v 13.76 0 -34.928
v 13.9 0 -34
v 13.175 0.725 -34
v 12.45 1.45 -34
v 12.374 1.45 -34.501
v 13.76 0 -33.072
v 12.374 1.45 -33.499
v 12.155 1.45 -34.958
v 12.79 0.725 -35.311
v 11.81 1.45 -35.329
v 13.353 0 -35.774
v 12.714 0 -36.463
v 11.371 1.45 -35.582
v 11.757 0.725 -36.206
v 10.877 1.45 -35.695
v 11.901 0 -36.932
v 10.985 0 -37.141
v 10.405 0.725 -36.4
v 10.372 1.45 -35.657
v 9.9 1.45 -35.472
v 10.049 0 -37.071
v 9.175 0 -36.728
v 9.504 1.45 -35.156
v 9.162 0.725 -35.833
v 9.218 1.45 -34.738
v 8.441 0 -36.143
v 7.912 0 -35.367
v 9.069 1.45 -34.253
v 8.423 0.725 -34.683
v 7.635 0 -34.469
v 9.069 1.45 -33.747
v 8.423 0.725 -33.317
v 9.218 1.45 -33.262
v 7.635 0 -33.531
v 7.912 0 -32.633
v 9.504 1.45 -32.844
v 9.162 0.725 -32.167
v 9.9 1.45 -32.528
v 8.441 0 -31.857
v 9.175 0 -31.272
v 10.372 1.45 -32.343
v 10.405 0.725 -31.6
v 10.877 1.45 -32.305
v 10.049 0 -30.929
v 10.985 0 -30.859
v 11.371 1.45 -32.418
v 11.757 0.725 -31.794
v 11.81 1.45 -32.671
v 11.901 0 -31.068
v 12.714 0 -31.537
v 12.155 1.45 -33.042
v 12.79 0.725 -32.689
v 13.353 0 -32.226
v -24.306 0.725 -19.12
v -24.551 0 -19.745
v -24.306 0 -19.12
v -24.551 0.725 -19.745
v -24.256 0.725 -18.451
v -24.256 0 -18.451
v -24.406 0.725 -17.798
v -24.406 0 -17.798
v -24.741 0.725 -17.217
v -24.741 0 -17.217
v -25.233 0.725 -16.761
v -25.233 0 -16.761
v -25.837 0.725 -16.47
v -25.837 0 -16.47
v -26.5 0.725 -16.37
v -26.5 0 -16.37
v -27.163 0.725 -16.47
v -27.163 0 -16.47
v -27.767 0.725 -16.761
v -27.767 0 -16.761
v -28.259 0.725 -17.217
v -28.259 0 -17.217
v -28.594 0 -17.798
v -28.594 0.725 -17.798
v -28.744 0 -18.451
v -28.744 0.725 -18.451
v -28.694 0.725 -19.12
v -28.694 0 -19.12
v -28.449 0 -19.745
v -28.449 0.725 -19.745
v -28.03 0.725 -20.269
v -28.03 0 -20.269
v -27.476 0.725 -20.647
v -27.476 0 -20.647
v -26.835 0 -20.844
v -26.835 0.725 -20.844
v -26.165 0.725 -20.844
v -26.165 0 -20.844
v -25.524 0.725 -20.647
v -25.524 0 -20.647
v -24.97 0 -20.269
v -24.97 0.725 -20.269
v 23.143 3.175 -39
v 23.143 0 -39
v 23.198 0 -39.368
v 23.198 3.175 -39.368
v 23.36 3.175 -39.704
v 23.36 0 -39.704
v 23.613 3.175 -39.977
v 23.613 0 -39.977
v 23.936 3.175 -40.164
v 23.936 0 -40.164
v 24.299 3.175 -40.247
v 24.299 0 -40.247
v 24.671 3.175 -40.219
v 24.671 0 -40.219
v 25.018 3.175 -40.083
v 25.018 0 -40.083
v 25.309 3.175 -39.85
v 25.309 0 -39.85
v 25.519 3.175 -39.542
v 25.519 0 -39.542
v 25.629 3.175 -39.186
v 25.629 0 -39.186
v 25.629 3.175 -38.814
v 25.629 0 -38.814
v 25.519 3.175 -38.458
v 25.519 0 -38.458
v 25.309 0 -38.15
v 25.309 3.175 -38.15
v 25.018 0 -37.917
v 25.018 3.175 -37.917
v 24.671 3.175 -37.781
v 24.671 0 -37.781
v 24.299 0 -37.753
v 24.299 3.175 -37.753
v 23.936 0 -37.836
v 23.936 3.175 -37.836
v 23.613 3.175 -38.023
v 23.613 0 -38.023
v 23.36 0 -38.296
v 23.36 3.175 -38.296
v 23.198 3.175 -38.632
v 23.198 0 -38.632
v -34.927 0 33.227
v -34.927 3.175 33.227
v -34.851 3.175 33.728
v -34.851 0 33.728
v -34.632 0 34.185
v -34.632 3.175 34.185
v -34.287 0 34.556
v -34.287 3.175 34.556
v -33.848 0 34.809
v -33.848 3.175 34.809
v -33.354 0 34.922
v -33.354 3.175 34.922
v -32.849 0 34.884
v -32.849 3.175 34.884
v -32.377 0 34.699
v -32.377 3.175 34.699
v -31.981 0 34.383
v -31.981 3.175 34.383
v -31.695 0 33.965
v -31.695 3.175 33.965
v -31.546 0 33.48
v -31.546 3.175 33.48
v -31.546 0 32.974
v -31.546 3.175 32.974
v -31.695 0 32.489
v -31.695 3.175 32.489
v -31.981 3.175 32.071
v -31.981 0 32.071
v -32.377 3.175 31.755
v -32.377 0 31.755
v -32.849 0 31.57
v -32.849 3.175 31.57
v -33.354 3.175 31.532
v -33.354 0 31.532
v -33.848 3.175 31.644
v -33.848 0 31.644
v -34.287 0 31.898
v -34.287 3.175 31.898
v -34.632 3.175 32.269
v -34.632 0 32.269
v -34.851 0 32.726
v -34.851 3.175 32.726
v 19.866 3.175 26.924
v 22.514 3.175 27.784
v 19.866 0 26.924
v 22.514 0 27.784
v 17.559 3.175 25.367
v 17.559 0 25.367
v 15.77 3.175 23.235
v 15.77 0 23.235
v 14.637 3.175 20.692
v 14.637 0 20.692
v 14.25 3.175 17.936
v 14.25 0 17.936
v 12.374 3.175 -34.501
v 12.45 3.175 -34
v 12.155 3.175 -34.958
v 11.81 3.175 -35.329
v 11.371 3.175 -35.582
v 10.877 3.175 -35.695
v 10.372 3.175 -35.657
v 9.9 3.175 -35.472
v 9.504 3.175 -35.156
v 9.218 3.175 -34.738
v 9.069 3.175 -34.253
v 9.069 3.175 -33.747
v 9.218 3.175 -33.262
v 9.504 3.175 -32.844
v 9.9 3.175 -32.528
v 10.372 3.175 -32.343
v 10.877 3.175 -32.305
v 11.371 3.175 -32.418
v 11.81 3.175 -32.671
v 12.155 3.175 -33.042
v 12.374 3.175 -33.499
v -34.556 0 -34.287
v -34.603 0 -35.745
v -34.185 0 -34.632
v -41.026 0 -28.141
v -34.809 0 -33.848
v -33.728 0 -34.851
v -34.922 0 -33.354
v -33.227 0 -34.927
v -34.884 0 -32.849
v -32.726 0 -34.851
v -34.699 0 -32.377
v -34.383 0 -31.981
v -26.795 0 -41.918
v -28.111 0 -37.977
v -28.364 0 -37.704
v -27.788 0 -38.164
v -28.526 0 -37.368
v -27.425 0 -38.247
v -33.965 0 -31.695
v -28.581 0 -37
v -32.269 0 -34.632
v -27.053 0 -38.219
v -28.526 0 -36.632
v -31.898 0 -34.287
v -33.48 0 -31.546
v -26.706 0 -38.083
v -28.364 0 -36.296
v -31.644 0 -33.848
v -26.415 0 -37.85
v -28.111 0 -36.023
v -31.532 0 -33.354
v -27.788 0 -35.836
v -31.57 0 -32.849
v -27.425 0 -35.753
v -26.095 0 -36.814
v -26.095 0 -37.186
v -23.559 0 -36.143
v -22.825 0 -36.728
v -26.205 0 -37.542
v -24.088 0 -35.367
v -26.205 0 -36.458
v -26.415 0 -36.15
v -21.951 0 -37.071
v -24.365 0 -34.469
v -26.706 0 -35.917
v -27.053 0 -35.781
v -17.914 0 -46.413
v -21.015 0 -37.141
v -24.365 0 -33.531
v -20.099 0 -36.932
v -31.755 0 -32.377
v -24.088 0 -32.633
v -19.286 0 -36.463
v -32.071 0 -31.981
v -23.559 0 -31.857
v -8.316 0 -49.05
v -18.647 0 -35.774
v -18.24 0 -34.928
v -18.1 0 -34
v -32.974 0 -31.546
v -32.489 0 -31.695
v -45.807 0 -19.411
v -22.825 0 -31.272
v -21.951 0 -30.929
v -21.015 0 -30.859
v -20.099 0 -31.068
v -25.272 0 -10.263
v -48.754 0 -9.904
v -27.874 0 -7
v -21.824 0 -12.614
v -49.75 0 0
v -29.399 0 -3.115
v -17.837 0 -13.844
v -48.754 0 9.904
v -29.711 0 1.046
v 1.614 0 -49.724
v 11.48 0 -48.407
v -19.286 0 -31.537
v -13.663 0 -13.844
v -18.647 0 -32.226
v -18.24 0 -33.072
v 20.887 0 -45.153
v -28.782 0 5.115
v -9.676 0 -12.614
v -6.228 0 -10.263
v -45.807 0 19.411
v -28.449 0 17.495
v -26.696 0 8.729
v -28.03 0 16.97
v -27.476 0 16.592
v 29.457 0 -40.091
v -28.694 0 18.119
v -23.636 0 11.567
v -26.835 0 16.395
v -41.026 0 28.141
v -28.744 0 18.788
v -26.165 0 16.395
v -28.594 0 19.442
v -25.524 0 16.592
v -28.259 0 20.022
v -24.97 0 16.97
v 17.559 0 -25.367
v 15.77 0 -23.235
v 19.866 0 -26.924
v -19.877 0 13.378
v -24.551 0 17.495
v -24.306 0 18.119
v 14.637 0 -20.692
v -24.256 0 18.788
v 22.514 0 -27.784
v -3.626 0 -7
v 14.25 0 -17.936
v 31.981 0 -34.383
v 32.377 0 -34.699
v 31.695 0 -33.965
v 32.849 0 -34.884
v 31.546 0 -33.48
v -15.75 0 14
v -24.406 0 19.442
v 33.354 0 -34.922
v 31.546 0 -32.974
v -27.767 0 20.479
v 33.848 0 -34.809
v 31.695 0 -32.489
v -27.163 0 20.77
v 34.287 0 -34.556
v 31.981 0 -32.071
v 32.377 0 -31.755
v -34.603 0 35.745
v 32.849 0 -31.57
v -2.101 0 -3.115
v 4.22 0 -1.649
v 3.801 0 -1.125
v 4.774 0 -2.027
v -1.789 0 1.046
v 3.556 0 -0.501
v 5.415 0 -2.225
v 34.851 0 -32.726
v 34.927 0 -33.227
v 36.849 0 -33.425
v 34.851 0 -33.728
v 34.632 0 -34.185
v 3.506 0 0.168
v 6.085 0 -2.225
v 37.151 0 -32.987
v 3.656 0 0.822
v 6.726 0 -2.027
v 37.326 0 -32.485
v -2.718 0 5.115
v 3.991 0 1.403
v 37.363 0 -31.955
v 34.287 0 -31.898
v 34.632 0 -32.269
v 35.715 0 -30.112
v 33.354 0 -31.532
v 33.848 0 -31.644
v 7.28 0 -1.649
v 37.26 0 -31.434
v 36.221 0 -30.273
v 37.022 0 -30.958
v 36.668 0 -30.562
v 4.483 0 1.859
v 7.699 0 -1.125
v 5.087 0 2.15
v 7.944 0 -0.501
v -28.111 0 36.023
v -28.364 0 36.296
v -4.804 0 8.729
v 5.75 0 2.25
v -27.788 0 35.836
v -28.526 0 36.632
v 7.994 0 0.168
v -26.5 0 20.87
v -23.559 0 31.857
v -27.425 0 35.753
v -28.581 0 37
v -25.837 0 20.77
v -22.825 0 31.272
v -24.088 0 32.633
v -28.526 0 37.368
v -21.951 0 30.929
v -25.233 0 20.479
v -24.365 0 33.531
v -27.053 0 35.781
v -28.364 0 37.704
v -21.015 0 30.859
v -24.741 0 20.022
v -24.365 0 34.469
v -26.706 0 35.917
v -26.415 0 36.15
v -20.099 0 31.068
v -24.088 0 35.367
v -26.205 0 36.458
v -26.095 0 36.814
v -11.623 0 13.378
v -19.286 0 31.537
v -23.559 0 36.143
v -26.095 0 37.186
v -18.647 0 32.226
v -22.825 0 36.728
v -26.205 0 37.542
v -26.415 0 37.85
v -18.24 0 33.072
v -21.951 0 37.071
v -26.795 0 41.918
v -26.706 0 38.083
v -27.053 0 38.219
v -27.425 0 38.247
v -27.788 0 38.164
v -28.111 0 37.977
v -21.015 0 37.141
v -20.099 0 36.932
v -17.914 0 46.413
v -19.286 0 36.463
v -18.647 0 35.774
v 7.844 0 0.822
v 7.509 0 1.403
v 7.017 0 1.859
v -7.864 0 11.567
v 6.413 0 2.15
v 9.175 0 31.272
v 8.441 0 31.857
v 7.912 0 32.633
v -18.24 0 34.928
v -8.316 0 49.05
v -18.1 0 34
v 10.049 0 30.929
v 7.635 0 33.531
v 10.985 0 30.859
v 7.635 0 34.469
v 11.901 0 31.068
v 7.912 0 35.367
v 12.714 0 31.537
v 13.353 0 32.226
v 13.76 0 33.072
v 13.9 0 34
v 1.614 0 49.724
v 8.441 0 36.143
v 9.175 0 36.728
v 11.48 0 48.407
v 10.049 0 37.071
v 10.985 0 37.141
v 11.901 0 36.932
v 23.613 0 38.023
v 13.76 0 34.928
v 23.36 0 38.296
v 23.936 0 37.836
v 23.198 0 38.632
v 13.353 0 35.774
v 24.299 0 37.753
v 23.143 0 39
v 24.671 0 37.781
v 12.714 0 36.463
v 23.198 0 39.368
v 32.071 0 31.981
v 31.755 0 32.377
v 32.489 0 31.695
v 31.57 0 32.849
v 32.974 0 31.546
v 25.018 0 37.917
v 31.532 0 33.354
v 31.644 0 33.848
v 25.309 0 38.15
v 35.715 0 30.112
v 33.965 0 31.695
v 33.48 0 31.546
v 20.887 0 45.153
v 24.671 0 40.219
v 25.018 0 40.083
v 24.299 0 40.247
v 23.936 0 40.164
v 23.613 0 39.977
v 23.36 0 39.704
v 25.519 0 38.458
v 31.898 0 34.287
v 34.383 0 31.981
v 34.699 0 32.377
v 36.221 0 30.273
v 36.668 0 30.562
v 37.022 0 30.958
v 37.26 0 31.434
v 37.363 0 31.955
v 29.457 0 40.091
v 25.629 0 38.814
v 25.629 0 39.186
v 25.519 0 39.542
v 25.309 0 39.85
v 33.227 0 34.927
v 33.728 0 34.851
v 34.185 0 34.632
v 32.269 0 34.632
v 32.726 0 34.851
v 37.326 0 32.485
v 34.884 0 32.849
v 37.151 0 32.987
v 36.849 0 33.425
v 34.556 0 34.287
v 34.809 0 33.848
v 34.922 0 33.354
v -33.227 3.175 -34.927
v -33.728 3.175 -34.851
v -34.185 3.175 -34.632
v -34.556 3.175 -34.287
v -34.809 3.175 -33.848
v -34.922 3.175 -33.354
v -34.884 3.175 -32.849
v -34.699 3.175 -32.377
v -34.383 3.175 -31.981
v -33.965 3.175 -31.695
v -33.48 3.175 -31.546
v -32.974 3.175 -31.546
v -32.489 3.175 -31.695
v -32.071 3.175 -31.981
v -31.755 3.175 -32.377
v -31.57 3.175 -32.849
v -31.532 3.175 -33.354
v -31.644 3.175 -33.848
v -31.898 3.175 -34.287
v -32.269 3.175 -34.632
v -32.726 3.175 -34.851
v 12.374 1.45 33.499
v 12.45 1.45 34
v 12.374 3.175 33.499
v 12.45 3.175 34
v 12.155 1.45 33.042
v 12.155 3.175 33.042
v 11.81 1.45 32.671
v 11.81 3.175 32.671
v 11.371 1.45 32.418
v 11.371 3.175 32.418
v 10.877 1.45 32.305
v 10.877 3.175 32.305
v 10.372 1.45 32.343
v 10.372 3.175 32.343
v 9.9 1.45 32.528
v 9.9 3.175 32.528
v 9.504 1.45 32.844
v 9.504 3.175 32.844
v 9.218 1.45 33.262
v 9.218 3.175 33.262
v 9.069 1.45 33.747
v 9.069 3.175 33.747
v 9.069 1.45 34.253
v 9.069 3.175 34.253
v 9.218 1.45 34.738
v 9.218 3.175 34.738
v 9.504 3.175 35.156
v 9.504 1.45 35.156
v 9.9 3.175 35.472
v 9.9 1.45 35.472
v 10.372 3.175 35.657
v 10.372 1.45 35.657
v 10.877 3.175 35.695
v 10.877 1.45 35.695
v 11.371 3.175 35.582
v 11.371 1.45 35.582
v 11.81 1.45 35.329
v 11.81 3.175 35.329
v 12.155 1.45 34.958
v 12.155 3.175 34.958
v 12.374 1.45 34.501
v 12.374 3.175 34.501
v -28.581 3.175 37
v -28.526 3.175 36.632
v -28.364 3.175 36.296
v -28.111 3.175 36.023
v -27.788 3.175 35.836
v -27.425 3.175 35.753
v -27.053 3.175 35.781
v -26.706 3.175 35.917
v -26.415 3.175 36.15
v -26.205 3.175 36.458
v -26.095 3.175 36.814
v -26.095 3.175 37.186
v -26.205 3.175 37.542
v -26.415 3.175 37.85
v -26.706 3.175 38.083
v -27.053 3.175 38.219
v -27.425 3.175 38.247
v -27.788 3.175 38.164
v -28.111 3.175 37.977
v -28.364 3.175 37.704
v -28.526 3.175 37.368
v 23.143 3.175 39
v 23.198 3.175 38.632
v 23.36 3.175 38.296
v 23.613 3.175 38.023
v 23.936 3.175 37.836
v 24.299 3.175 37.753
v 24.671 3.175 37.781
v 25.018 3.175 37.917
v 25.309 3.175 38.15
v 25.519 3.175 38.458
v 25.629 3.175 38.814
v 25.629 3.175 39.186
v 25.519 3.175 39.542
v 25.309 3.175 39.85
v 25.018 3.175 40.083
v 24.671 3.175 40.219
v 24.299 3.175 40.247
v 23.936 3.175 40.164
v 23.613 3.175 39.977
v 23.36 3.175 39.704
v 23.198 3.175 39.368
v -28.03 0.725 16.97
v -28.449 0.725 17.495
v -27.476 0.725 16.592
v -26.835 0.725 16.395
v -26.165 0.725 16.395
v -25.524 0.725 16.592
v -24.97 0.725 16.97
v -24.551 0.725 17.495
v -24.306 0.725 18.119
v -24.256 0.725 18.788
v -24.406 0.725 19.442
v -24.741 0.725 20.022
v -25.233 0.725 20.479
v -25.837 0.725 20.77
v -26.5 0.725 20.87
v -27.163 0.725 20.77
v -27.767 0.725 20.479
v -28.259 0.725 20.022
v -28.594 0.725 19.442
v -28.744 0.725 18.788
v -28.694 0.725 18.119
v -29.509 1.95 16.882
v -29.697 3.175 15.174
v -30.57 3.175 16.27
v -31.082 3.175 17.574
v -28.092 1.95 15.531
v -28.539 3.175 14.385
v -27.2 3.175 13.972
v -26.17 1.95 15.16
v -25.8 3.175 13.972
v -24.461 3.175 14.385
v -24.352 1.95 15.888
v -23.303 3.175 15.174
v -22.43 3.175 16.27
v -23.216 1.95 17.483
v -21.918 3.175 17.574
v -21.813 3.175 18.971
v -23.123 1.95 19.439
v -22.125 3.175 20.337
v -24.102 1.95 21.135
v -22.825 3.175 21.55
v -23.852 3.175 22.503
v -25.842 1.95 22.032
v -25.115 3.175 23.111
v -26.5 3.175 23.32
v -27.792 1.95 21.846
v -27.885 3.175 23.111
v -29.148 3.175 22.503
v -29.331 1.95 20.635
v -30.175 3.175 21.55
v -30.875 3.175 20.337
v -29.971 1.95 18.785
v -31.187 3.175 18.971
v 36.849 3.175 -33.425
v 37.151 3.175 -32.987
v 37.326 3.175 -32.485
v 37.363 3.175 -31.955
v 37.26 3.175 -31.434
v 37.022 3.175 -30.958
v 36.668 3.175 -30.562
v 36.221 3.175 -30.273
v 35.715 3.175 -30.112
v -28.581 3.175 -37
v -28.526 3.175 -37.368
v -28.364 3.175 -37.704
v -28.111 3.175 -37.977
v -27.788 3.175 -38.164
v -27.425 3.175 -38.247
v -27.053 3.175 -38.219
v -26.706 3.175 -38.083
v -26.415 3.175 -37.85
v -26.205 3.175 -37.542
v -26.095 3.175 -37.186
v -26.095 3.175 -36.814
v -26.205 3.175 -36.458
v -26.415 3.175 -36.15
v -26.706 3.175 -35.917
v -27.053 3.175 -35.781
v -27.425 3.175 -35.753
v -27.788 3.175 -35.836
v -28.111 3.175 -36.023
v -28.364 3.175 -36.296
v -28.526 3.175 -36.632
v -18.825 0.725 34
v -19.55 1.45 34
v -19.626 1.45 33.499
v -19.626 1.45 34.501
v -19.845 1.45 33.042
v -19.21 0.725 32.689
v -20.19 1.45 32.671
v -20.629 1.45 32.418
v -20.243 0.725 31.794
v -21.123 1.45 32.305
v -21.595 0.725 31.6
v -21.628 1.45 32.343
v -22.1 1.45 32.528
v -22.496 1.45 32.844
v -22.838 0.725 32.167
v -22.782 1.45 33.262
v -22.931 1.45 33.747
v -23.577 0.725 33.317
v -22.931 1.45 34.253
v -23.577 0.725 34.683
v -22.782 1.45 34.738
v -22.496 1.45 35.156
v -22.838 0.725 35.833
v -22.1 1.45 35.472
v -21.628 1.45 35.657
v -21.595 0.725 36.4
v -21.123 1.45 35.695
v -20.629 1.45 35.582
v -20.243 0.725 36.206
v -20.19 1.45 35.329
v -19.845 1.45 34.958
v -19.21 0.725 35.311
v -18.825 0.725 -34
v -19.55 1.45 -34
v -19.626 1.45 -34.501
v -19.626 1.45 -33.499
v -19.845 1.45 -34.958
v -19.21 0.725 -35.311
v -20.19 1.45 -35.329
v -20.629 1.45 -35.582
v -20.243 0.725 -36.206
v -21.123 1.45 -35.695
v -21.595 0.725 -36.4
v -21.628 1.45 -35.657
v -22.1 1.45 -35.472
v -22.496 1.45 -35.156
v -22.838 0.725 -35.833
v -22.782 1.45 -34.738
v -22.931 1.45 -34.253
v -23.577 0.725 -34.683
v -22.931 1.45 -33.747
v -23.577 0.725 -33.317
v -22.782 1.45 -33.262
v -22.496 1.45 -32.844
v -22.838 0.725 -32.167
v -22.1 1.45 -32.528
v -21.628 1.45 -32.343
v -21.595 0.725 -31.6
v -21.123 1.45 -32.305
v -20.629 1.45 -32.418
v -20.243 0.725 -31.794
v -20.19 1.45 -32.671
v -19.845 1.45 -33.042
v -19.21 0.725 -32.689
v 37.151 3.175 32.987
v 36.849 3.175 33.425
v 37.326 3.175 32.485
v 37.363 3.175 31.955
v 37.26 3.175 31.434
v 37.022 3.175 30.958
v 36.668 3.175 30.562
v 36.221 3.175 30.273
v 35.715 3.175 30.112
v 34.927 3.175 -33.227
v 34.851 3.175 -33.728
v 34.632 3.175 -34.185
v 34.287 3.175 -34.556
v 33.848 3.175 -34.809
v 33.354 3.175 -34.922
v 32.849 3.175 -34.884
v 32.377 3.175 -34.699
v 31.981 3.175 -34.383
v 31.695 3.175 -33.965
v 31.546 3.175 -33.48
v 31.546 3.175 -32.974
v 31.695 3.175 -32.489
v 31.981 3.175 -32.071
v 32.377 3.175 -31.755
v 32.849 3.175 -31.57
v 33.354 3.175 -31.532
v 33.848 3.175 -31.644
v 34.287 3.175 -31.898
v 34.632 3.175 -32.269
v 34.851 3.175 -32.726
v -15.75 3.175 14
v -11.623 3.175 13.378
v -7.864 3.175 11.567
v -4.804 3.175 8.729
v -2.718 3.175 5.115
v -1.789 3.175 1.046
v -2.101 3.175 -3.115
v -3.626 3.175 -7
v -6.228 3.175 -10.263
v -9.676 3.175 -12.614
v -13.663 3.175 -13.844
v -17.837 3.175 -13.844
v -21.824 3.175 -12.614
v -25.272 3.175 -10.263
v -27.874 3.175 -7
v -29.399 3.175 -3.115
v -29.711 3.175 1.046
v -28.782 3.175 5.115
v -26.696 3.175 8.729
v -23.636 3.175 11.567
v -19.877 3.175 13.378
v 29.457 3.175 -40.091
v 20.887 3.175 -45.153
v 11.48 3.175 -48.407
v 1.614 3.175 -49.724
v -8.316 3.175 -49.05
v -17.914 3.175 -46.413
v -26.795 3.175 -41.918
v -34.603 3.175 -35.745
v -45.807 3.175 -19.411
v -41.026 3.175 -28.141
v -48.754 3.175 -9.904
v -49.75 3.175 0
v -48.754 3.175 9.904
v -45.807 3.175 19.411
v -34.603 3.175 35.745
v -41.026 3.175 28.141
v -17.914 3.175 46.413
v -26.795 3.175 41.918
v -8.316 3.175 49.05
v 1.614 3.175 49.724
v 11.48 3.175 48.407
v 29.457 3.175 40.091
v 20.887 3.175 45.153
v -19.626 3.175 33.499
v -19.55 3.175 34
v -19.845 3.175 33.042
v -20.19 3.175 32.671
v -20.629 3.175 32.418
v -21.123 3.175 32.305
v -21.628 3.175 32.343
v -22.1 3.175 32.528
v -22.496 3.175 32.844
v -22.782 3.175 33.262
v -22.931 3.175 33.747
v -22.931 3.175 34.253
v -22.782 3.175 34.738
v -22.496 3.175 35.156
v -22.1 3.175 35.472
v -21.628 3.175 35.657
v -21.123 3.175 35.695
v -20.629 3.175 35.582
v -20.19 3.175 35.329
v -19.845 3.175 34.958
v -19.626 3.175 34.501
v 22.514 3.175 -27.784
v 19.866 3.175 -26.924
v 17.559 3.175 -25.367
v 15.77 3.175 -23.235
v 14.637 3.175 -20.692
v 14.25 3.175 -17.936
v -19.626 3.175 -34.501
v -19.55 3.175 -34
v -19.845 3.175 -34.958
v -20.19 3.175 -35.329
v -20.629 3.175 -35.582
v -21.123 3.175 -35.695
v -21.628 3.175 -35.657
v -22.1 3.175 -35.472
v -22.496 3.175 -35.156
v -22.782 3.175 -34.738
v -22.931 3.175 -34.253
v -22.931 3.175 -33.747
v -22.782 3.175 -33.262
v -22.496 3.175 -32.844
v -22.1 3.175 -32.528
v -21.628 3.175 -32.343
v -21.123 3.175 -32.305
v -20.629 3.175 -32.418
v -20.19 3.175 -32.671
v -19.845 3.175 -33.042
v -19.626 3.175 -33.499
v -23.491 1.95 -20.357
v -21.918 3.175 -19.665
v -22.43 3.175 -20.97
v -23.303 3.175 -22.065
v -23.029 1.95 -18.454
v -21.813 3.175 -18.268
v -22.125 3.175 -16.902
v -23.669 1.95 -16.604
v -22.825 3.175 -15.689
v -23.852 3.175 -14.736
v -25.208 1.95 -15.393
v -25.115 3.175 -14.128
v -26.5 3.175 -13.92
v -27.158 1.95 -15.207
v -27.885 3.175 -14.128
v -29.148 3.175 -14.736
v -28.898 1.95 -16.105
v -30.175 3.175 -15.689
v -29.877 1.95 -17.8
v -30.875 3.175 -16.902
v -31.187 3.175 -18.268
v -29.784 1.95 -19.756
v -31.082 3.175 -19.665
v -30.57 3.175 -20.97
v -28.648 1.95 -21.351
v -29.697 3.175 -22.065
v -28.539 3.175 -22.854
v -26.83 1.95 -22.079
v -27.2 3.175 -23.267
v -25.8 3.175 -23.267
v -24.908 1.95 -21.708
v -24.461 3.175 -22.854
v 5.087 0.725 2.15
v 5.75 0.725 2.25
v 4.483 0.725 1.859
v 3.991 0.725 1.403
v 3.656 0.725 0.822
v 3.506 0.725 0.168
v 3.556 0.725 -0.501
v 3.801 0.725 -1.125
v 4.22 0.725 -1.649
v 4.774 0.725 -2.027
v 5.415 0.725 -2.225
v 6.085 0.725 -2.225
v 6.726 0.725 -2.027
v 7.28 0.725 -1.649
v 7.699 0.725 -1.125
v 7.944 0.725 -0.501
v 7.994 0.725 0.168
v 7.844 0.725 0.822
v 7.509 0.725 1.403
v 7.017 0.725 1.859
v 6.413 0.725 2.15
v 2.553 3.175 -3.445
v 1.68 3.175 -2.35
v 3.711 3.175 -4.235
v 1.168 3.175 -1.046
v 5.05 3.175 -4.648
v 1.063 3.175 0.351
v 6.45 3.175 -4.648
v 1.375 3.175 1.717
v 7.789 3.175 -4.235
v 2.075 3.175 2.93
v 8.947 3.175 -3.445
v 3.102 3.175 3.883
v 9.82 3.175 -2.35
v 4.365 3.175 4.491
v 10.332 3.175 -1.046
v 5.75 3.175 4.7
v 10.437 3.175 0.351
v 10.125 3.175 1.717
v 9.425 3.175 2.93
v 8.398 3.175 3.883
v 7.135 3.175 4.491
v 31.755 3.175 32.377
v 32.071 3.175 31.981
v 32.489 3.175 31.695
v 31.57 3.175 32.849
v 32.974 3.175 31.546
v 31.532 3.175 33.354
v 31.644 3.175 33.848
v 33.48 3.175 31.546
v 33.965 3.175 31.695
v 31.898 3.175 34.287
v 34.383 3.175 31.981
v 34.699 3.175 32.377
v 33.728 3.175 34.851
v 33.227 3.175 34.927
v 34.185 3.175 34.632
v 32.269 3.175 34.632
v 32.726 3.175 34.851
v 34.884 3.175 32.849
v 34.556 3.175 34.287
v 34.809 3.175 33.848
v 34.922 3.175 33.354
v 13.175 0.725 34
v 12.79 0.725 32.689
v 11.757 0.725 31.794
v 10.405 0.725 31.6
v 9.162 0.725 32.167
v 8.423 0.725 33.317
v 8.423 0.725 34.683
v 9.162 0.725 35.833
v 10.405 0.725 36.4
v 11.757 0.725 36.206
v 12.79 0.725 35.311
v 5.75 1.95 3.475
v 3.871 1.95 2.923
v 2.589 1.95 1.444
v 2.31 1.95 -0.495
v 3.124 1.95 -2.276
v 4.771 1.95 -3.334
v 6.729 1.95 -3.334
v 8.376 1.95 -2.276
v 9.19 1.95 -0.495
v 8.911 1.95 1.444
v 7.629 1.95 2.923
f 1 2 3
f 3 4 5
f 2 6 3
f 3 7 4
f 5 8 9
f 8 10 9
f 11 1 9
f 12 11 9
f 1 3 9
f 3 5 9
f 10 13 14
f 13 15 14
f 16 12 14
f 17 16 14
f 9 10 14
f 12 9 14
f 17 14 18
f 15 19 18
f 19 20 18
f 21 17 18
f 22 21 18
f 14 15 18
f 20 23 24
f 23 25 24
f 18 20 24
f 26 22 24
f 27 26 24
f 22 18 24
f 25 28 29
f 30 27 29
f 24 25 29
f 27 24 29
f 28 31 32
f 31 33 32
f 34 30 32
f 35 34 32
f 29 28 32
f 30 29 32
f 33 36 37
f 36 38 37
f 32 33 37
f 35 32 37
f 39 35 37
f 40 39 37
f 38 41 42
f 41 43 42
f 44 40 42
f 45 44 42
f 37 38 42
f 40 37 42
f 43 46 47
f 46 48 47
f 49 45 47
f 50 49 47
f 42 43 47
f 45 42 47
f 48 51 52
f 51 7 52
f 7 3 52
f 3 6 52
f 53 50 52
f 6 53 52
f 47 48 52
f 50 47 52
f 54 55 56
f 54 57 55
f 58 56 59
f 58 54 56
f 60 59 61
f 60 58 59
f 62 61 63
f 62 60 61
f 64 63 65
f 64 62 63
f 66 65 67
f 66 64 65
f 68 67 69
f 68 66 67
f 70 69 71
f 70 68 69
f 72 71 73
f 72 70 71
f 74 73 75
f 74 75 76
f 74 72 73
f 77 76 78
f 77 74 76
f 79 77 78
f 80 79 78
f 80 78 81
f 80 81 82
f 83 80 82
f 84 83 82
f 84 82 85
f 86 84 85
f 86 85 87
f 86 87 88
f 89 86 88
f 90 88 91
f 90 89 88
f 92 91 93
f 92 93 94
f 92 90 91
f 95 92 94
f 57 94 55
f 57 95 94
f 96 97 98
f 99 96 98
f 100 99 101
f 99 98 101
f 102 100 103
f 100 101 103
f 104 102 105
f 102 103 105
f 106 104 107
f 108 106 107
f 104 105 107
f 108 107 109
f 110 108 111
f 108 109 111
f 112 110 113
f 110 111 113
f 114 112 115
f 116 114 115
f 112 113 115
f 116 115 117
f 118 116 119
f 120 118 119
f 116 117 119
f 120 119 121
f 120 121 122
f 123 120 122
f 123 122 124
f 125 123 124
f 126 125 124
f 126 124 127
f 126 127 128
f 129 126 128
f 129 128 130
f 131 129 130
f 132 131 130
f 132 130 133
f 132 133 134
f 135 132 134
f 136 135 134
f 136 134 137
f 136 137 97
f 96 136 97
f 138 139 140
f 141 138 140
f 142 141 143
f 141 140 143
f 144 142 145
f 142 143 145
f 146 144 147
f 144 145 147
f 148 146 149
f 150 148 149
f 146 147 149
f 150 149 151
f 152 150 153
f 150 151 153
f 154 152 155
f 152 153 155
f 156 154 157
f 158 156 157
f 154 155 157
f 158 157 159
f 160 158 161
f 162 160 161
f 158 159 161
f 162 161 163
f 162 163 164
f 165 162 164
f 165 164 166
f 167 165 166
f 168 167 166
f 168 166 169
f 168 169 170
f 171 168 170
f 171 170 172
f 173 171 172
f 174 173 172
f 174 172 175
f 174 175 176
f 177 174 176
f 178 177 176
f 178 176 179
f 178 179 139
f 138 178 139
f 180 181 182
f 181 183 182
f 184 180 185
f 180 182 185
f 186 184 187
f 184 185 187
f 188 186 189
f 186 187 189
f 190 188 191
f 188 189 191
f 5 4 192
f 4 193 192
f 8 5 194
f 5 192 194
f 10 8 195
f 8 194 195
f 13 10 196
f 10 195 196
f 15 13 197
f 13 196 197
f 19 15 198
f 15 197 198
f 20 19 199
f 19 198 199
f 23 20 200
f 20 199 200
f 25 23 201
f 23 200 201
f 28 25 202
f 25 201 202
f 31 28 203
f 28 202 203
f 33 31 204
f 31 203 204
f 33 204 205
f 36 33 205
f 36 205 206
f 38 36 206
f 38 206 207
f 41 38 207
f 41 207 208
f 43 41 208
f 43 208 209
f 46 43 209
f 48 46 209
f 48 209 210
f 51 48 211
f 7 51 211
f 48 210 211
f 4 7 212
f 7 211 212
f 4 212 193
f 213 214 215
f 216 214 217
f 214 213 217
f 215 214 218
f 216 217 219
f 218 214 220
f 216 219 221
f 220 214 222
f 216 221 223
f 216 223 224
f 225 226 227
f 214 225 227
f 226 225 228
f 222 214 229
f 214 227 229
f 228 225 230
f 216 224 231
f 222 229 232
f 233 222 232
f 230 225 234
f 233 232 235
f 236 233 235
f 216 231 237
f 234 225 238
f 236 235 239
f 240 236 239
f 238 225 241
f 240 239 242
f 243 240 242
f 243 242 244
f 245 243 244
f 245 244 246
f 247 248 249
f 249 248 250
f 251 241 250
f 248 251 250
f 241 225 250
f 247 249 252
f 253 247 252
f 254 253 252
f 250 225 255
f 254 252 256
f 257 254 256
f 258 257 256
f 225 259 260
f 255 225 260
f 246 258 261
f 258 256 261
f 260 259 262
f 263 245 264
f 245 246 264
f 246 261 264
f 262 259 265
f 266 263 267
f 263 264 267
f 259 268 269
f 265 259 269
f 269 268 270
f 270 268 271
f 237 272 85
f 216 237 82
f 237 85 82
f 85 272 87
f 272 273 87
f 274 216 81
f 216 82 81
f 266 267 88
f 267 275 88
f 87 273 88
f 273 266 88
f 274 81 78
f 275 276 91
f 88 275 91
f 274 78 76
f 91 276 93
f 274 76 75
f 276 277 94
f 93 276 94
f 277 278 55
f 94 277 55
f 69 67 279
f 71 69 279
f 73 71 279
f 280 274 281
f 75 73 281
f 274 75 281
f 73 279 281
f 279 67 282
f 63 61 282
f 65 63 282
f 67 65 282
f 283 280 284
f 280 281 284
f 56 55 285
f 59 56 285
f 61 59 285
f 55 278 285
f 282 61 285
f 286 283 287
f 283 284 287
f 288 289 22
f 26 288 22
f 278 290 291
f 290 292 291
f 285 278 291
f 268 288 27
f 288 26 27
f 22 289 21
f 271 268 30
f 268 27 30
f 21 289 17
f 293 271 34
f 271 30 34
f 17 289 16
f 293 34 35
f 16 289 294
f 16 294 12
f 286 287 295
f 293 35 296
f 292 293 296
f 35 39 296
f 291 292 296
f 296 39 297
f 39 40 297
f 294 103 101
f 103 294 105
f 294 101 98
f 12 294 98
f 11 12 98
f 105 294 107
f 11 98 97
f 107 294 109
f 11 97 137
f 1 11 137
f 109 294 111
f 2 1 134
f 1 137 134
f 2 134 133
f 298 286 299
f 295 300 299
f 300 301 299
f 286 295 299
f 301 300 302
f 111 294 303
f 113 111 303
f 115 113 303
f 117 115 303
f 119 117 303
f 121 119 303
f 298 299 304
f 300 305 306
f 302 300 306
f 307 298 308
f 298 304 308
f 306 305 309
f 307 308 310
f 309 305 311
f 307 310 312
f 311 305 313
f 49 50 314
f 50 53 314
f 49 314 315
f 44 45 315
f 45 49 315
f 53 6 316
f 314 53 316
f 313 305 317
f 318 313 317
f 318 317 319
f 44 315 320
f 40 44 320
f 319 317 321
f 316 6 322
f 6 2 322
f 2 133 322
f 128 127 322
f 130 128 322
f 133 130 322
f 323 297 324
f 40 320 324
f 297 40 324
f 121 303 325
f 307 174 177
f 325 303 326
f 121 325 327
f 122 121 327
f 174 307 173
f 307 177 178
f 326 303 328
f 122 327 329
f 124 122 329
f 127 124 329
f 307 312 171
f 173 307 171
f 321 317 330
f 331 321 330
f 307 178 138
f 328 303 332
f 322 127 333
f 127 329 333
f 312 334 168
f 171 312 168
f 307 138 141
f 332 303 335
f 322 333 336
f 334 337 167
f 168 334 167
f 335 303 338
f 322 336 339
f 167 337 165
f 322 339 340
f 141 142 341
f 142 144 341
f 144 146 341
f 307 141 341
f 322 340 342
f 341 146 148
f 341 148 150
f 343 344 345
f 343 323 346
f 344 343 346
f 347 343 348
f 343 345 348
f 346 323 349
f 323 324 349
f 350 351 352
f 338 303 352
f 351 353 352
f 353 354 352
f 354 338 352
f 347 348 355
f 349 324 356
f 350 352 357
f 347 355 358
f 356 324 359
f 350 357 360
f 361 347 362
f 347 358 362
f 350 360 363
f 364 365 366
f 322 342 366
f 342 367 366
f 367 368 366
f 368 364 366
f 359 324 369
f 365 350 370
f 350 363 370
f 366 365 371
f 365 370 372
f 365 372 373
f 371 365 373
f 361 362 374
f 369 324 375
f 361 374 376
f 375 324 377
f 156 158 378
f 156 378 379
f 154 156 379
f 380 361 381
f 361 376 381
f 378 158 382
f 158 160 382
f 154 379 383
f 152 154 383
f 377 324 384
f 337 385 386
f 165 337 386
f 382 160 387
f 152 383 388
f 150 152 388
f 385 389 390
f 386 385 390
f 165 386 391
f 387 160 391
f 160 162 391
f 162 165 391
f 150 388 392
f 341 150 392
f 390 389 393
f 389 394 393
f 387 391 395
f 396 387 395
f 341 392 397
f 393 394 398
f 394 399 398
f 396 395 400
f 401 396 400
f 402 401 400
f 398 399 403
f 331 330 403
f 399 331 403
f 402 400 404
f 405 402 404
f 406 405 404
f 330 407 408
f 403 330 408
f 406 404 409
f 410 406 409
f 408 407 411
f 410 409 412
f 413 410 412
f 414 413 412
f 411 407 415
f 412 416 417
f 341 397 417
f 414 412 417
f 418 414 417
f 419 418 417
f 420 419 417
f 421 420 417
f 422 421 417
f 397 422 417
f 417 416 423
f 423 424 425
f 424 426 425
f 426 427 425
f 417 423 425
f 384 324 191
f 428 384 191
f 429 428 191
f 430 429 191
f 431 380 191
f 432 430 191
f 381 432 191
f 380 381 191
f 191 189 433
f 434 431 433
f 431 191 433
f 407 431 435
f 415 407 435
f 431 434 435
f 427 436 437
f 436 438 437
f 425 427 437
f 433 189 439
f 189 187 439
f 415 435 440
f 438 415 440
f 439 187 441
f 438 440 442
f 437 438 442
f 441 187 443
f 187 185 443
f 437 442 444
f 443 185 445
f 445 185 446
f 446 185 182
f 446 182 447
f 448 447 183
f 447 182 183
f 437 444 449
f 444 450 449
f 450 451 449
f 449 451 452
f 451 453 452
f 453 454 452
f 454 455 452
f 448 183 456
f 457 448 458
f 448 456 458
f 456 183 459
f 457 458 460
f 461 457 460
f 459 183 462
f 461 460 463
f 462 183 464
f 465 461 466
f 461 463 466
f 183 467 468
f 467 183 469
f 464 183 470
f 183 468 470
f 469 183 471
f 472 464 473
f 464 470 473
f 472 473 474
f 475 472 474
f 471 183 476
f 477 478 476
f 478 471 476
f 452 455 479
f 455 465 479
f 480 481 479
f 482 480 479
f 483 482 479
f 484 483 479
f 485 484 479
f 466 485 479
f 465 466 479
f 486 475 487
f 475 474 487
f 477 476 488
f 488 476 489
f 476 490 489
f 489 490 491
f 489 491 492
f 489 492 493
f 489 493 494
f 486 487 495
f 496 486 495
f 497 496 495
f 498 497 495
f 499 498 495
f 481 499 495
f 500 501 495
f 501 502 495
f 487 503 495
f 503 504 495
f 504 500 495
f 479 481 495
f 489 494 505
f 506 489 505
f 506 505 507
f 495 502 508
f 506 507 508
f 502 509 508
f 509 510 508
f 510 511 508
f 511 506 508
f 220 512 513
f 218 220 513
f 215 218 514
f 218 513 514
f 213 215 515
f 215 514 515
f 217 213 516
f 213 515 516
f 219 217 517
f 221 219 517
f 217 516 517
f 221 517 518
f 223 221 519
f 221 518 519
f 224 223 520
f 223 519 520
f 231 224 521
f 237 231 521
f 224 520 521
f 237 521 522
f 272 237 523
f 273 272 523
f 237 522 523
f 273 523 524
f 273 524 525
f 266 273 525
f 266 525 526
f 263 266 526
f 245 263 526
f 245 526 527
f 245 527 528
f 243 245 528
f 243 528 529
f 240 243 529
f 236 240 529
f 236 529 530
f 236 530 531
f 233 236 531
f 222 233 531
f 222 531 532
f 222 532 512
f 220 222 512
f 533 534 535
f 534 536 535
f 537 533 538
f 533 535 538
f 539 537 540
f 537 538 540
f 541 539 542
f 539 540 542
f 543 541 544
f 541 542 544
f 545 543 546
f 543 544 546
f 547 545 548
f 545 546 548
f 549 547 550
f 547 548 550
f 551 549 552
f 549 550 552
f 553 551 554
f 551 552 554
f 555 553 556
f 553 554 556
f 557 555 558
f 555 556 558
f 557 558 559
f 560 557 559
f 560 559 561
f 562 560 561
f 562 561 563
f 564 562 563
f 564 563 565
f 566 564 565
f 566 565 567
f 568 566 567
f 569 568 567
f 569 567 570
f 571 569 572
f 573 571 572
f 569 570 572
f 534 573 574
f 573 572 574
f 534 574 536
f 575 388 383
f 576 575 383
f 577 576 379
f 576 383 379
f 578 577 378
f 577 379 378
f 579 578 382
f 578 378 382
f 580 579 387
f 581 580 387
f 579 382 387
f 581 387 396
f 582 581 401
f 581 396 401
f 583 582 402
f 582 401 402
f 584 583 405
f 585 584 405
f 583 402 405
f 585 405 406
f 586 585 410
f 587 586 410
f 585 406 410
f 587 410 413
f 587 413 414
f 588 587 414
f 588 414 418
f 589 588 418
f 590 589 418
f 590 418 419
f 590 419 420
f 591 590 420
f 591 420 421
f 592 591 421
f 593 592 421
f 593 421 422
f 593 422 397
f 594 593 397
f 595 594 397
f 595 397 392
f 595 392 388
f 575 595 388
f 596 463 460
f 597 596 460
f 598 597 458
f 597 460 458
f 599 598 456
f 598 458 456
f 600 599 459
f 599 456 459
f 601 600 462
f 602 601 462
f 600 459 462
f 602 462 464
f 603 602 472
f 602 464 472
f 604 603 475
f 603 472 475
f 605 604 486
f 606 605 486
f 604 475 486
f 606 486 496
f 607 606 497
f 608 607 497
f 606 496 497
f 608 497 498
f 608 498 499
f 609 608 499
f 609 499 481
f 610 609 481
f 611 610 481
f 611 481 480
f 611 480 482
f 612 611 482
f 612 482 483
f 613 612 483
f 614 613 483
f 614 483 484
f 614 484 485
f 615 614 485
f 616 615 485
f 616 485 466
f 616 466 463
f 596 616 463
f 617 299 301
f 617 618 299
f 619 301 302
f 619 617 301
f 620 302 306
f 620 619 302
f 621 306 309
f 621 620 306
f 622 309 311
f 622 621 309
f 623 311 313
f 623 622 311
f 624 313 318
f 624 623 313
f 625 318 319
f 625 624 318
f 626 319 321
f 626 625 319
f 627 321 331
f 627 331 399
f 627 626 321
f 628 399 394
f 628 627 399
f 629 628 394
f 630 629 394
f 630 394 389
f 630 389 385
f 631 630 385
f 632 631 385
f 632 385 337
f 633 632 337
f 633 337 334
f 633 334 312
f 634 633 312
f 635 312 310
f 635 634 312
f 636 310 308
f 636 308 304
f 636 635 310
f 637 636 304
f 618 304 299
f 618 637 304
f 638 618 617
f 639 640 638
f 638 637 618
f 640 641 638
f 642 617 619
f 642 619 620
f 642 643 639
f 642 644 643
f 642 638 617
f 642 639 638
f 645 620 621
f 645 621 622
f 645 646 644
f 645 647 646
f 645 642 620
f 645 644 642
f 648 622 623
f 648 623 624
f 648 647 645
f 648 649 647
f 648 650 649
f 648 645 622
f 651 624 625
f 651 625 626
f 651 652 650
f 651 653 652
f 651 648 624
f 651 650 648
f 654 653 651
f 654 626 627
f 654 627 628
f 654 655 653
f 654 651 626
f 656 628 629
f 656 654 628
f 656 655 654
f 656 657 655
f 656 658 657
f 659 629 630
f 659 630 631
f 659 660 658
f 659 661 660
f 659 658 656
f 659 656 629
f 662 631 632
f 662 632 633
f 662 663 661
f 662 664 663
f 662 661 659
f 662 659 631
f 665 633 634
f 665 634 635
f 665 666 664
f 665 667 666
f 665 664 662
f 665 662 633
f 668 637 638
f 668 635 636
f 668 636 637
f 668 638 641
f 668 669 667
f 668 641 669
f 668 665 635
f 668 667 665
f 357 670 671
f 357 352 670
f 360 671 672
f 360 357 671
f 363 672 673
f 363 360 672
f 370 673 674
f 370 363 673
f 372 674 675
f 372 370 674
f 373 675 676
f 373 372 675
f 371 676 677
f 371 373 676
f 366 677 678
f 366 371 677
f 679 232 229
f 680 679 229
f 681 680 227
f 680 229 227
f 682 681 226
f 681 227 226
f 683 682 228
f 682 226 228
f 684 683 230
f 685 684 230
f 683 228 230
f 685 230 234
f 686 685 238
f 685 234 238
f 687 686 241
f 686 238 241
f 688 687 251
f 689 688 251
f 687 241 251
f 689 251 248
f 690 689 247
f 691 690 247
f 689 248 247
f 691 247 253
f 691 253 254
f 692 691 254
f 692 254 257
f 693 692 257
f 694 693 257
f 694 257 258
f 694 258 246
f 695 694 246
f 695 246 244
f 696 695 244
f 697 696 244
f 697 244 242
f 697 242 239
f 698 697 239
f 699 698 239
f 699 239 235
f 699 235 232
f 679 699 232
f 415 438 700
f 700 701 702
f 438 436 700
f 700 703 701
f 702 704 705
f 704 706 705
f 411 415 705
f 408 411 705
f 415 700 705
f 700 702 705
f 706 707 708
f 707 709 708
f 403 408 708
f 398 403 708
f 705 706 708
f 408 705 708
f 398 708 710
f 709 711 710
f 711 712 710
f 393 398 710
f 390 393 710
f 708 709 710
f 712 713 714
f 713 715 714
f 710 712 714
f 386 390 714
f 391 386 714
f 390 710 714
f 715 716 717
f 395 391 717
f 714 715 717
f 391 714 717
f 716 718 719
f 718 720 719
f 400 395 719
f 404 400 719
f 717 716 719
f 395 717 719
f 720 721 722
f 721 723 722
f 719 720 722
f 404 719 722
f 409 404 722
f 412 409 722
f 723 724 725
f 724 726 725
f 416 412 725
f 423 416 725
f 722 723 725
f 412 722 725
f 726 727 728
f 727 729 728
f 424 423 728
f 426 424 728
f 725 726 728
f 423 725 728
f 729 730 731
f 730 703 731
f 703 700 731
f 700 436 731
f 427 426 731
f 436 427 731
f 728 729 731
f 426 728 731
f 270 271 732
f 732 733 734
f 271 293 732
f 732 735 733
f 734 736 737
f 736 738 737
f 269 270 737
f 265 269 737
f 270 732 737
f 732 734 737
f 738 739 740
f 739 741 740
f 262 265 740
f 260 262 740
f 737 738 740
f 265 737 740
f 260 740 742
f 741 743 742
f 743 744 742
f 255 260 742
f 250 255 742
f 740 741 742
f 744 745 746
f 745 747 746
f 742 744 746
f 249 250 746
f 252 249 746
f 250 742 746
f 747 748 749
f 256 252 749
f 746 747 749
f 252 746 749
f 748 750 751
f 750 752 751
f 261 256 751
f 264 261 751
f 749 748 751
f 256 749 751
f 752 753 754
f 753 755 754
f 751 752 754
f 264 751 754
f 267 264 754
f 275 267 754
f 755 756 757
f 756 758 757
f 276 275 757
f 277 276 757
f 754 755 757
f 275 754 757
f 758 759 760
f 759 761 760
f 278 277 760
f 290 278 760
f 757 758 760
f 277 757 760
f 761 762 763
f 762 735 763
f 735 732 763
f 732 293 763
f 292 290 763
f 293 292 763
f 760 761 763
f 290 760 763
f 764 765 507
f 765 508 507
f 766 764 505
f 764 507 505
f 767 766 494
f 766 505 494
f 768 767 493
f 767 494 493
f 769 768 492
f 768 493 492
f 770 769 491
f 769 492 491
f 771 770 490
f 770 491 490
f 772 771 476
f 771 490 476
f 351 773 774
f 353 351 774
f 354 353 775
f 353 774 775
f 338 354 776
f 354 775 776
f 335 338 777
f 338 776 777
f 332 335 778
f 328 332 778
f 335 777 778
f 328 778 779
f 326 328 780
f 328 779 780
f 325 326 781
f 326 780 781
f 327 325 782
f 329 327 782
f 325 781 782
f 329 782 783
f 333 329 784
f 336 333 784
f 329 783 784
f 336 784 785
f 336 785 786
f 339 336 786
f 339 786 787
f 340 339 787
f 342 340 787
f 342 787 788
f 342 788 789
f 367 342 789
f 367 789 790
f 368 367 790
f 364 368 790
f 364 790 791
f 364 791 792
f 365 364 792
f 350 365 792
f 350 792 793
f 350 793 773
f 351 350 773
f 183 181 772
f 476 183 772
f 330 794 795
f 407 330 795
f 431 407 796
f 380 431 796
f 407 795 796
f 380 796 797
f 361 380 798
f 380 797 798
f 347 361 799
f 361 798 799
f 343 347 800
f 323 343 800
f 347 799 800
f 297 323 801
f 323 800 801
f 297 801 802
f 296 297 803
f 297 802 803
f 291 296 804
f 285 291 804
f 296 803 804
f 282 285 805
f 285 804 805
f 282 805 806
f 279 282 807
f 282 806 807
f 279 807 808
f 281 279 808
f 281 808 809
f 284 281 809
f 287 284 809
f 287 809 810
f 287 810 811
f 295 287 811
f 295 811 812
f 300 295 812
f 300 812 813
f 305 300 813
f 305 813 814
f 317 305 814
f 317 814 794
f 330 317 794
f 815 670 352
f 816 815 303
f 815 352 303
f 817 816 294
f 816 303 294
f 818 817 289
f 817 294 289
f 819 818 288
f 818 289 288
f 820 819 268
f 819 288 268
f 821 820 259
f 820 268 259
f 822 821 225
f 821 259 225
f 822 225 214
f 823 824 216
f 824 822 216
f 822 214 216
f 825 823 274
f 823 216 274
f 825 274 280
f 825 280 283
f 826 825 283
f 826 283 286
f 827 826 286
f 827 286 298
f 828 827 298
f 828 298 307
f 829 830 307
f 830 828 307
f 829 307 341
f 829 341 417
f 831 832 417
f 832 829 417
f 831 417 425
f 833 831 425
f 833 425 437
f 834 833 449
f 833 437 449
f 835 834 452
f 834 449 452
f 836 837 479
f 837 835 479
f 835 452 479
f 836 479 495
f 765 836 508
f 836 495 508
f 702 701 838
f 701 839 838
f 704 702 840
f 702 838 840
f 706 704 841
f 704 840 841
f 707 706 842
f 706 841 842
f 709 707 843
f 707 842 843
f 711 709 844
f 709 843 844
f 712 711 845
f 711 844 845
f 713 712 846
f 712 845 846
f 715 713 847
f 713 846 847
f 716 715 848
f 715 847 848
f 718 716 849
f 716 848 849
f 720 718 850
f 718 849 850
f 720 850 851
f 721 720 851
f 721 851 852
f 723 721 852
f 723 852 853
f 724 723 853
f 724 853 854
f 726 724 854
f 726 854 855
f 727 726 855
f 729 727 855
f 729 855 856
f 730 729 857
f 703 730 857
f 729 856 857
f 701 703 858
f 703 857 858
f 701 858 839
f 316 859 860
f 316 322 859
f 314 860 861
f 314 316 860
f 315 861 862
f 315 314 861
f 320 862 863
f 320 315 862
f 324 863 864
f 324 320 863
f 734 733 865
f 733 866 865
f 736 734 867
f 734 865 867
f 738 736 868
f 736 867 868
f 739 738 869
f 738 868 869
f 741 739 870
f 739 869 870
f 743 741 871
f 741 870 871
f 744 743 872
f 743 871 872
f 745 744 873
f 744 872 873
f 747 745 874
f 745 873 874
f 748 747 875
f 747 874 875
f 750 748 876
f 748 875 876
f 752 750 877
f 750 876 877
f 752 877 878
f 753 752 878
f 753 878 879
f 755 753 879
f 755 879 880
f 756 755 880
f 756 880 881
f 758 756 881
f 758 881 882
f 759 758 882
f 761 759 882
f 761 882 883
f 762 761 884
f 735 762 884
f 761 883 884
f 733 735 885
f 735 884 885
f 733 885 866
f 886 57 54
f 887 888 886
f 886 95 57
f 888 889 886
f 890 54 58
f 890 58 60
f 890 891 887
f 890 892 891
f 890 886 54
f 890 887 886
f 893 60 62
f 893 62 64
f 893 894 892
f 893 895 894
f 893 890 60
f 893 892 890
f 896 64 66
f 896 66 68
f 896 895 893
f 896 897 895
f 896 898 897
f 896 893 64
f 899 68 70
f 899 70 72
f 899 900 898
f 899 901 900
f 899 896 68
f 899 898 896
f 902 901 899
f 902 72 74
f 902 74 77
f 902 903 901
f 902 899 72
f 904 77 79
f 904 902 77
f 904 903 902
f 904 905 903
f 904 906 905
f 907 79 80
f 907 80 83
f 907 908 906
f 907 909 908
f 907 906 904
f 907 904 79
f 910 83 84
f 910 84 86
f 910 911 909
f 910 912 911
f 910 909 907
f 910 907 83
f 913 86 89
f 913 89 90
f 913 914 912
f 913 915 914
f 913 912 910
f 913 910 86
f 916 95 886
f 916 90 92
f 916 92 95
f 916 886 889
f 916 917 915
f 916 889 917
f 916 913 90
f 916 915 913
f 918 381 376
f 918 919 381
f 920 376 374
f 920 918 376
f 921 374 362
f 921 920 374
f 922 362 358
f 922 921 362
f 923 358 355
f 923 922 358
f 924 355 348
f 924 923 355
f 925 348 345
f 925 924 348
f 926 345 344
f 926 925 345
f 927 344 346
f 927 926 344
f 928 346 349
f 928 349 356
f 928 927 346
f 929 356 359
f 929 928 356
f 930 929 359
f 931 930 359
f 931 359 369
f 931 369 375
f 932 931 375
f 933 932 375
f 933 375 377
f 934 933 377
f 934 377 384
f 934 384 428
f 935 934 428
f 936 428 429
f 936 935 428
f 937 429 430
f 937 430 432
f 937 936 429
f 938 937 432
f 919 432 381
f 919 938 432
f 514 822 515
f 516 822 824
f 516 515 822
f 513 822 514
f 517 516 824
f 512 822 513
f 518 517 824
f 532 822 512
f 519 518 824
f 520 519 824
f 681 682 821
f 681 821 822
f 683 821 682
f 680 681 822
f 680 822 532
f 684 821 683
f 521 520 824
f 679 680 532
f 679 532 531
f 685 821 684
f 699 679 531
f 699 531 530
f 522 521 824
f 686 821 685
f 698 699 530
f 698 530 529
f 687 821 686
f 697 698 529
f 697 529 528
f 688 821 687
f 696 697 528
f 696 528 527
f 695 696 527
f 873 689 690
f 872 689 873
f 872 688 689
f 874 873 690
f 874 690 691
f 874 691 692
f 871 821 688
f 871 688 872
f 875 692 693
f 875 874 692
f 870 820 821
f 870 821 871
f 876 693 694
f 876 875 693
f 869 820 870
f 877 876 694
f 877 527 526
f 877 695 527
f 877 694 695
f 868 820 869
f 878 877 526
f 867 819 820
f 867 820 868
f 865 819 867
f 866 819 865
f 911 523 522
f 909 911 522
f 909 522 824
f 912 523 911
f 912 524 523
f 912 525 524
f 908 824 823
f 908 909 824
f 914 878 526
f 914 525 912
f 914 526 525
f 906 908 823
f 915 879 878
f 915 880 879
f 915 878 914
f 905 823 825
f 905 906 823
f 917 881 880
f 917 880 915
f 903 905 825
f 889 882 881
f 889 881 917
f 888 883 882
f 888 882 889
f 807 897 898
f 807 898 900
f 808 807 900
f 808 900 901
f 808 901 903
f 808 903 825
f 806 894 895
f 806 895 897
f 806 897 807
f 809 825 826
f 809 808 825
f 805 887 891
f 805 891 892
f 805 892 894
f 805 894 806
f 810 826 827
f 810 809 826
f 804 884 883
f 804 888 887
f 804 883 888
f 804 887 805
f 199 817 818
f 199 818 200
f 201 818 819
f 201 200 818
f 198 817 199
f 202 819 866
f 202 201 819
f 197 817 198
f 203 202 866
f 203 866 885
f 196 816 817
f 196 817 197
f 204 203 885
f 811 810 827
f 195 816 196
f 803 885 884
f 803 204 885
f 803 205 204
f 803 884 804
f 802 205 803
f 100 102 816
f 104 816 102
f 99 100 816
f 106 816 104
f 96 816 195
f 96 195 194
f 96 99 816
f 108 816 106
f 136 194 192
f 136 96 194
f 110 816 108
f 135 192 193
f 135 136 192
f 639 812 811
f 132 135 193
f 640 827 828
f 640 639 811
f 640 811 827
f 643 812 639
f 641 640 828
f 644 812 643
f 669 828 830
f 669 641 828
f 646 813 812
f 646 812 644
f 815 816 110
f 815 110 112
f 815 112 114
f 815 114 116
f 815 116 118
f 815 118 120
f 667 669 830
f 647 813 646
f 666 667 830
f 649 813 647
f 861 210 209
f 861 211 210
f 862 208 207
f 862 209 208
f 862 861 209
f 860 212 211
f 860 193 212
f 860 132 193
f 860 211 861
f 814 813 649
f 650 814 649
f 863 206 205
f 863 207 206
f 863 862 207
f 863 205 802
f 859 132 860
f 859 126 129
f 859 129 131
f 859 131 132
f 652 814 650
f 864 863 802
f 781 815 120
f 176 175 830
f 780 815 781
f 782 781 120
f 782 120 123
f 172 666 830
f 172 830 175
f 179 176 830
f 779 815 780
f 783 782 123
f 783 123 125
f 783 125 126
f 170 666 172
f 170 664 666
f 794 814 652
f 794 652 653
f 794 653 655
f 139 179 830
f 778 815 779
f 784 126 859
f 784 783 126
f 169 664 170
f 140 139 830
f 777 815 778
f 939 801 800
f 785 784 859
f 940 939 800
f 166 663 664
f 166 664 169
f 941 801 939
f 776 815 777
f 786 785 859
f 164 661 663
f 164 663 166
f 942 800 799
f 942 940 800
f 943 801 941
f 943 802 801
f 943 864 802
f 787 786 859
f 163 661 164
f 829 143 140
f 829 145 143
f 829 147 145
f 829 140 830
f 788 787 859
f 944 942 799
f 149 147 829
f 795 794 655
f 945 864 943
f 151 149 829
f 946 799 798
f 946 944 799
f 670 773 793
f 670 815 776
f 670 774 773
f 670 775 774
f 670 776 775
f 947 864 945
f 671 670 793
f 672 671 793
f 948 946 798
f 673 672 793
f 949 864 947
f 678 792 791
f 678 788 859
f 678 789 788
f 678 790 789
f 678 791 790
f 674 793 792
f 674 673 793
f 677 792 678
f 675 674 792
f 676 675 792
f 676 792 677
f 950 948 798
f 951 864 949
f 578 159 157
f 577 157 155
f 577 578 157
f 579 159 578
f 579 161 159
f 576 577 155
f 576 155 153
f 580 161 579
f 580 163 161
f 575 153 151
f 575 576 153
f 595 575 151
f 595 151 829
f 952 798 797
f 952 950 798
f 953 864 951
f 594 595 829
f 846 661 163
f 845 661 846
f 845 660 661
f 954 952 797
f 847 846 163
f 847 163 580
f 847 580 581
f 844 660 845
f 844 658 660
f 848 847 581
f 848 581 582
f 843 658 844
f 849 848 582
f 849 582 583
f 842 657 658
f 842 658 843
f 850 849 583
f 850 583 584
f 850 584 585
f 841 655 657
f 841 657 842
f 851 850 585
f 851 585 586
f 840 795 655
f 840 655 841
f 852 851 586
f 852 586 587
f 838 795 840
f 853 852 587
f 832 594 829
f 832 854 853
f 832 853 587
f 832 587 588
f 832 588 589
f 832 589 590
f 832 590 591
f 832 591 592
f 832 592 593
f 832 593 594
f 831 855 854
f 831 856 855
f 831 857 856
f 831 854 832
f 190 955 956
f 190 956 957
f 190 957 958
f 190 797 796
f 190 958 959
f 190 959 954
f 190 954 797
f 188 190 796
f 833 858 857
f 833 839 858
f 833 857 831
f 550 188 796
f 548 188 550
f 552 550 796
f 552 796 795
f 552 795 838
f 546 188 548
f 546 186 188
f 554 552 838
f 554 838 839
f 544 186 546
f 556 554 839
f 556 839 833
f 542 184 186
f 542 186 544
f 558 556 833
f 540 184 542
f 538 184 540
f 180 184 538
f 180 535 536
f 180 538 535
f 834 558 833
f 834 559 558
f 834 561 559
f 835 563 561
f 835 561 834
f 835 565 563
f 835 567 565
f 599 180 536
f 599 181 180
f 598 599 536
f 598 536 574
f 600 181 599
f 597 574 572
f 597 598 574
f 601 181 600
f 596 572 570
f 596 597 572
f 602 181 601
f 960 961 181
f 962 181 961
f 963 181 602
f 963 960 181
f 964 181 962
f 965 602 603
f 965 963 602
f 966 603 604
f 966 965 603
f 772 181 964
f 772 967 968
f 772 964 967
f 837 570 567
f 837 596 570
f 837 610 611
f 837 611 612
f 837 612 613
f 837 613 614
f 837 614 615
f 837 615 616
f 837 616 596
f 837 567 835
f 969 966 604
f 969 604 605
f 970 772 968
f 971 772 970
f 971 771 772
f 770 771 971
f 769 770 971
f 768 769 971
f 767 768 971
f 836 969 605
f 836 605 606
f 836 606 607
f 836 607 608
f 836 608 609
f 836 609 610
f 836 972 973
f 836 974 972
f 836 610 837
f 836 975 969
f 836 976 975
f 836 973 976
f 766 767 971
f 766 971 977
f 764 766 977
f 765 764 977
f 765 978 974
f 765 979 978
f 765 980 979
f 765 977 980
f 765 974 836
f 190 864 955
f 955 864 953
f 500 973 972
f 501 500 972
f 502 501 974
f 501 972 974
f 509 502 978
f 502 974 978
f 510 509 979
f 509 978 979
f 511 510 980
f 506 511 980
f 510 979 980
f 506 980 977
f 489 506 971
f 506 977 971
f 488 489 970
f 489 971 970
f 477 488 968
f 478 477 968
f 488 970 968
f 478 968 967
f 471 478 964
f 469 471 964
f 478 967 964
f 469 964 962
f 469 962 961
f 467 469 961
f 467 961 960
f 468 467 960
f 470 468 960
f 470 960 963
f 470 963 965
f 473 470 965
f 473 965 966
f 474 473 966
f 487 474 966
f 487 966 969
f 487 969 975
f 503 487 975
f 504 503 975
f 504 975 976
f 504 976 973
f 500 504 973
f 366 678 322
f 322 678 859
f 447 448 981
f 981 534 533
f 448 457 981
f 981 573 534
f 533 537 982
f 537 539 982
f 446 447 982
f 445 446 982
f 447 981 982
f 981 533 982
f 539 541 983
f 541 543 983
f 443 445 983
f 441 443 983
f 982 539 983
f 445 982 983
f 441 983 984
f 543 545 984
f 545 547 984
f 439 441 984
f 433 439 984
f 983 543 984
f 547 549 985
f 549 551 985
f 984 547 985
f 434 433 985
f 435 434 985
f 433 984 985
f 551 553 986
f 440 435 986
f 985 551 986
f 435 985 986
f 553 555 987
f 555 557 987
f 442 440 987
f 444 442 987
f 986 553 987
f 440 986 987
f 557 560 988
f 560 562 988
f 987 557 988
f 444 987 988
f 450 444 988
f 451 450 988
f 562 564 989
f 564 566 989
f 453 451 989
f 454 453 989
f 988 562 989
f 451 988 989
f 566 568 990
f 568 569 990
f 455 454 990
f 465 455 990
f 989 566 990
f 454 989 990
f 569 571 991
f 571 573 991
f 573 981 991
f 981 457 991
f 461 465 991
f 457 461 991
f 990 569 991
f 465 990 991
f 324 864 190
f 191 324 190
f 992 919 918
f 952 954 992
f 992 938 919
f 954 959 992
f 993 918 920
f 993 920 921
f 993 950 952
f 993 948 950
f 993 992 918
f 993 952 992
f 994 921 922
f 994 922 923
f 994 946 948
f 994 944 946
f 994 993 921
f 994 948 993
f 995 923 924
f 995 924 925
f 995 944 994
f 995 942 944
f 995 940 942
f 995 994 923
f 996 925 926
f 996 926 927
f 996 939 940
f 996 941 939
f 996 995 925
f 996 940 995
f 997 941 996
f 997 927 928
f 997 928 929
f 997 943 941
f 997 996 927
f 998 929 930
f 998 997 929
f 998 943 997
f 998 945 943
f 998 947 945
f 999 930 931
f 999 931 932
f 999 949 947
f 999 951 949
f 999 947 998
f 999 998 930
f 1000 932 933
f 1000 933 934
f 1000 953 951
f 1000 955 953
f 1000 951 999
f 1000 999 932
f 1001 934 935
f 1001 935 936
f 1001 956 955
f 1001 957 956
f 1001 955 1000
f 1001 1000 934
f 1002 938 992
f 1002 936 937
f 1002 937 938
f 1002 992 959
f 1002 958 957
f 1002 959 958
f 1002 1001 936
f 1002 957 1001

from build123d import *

# Parameters (mm, degrees)
SKETCH1_R                                       = 49.75
BOSS_EXTRUDE1_DEPTH                             = 3.175
CUT_EXTRUDE1_DEPTH                              = 71.428727271
SKETCH3_R                                       = 14
CUT_EXTRUDE2_DEPTH                              = 71.428727271
CIRPATTERN1_COUNT                               = 3
F_3_4_3_4_DIAMETER_HOLE1_D                      = 3.4
CIRPATTERN2_COUNT                               = 4
CSK_FOR_M3_FLAT_HEAD_MACHINE_SCREW2_D           = 3.4
CSK_FOR_M3_FLAT_HEAD_MACHINE_SCREW2_CSINK_D     = 6.3
CSK_FOR_M3_FLAT_HEAD_MACHINE_SCREW2_CSINK_ANGLE = 90
FILLET1_R                                       = 2
FILLET2_R                                       = 10
M3X0_5_TAPPED_HOLE1_D                           = 2.5


with BuildPart() as part:
    # Sketch1 → Boss-Extrude1 (new body)
    with BuildSketch(Plane(origin=(0, 0, 0), x_dir=(1, 0, 0), z_dir=(0, 1, 0))):
        Circle(SKETCH1_R)
    extrude(amount=BOSS_EXTRUDE1_DEPTH)

    # Sketch2 → Cut-Extrude1 (cut, through all)
    with BuildSketch(Plane(origin=(0, 3.175, 0), x_dir=(1, 0, 0), z_dir=(0, 1, 0))):
        with BuildLine():
            Line((33.834716203, 29.780120501), (14.25, 26.326806625))
            Line((14.25, 26.326806625), (14.25, -26.326806625))
            Line((14.25, -26.326806625), (39.136360913, -30.714943505))
            ThreePointArc((39.136360913, -30.714943505), (47.021784608, -16.248516003), (49.75, 0))
            ThreePointArc((49.75, 0), (47.021784608, 16.248516003), (39.136360913, 30.714943505))
            Line((39.136360913, 30.714943505), (33.834716203, 29.780120501))
        make_face()
    extrude(amount=-CUT_EXTRUDE1_DEPTH, mode=Mode.SUBTRACT)

    # Sketch3 → Cut-Extrude2 (cut, through all)
    with BuildSketch(Plane(origin=(0, 3.175, 0), x_dir=(1, 0, 0), z_dir=(0, 1, 0))):
        with Locations((-15.75, 0)):
            Circle(SKETCH3_R)
    extrude(amount=-CUT_EXTRUDE2_DEPTH, mode=Mode.SUBTRACT)

    # Sketch6 → CSK for M4 Flat Head Machine Screw1 (revolve, cut)
    with BuildSketch(Plane(origin=(5.75, 3.175, 0), x_dir=(0, 0, 1), z_dir=(1, 0, 0))):
        Polygon((0, 0), (0, 3.175), (2.25, 3.175), (2.25, 2.45), (4.7, 0), align=None)
    csk_for_m4_flat_head_machine_screw1 = revolve(axis=Axis((5.75, 9.525, 0), (0, -1, 0)), mode=Mode.SUBTRACT)

    # CirPattern1: CSK for M4 Flat Head Machine Screw1 ×3 about axis
    cirpattern1_axis = Axis((-15.75, 3.175, 0), (0, 1, 0))
    for i in range(1, CIRPATTERN1_COUNT):
        add(csk_for_m4_flat_head_machine_screw1.rotate(cirpattern1_axis, i * 360 / CIRPATTERN1_COUNT), mode=Mode.SUBTRACT)

    # Ø3.4 (3.4) Diameter Hole1 (through all)
    with Locations(Plane(origin=(0, 0, 0), x_dir=(-1, 0, 0), z_dir=(0, -1, 0))):
        with Locations((-33.226947648, 33.226947648)):
            f_3_4_3_4_diameter_hole1 = Hole(F_3_4_3_4_DIAMETER_HOLE1_D / 2)

    # CirPattern2: Ø3.4 (3.4) Diameter Hole1 ×4 about axis
    cirpattern2_axis = Axis((0, 3.175, 0), (0, -1, 0))
    for i in range(1, CIRPATTERN2_COUNT):
        add(f_3_4_3_4_diameter_hole1.rotate(cirpattern2_axis, i * 360 / CIRPATTERN2_COUNT), mode=Mode.SUBTRACT)

    # CSK for M3 Flat Head Machine Screw2 (through all)
    with Locations(Plane(origin=(0, 0, 0), x_dir=(-1, 0, 0), z_dir=(0, -1, 0))):
        with Locations((21.25, -34), (-10.75, -34), (-10.75, 34), (21.25, 34)):
            CounterSinkHole(CSK_FOR_M3_FLAT_HEAD_MACHINE_SCREW2_D / 2, CSK_FOR_M3_FLAT_HEAD_MACHINE_SCREW2_CSINK_D / 2, counter_sink_angle=CSK_FOR_M3_FLAT_HEAD_MACHINE_SCREW2_CSINK_ANGLE)

    # Fillet1
    fillet1_edges = [part.edges().sort_by_distance(p)[0] for p in [
        (39.136360913, 1.5875, 30.714943505),
        (39.136360913, 1.5875, -30.714943505),
    ]]
    fillet(fillet1_edges, radius=FILLET1_R)

    # Fillet2
    fillet2_edges = [part.edges().sort_by_distance(p)[0] for p in [
        (14.25, 1.5875, -26.326806625),
        (14.25, 1.5875, 26.326806625),
    ]]
    fillet(fillet2_edges, radius=FILLET2_R)

    # M3x0.5 Tapped Hole1 (through all)
    with Locations(Plane(origin=(0, 3.175, 0), x_dir=(1, 0, 0), z_dir=(0, 1, 0))):
        with Locations((-27.331300737, -37), (24.392621835, -39), (24.392621835, 39), (-27.331300737, 37)):
            Hole(M3X0_5_TAPPED_HOLE1_D / 2)


solid = part.part
